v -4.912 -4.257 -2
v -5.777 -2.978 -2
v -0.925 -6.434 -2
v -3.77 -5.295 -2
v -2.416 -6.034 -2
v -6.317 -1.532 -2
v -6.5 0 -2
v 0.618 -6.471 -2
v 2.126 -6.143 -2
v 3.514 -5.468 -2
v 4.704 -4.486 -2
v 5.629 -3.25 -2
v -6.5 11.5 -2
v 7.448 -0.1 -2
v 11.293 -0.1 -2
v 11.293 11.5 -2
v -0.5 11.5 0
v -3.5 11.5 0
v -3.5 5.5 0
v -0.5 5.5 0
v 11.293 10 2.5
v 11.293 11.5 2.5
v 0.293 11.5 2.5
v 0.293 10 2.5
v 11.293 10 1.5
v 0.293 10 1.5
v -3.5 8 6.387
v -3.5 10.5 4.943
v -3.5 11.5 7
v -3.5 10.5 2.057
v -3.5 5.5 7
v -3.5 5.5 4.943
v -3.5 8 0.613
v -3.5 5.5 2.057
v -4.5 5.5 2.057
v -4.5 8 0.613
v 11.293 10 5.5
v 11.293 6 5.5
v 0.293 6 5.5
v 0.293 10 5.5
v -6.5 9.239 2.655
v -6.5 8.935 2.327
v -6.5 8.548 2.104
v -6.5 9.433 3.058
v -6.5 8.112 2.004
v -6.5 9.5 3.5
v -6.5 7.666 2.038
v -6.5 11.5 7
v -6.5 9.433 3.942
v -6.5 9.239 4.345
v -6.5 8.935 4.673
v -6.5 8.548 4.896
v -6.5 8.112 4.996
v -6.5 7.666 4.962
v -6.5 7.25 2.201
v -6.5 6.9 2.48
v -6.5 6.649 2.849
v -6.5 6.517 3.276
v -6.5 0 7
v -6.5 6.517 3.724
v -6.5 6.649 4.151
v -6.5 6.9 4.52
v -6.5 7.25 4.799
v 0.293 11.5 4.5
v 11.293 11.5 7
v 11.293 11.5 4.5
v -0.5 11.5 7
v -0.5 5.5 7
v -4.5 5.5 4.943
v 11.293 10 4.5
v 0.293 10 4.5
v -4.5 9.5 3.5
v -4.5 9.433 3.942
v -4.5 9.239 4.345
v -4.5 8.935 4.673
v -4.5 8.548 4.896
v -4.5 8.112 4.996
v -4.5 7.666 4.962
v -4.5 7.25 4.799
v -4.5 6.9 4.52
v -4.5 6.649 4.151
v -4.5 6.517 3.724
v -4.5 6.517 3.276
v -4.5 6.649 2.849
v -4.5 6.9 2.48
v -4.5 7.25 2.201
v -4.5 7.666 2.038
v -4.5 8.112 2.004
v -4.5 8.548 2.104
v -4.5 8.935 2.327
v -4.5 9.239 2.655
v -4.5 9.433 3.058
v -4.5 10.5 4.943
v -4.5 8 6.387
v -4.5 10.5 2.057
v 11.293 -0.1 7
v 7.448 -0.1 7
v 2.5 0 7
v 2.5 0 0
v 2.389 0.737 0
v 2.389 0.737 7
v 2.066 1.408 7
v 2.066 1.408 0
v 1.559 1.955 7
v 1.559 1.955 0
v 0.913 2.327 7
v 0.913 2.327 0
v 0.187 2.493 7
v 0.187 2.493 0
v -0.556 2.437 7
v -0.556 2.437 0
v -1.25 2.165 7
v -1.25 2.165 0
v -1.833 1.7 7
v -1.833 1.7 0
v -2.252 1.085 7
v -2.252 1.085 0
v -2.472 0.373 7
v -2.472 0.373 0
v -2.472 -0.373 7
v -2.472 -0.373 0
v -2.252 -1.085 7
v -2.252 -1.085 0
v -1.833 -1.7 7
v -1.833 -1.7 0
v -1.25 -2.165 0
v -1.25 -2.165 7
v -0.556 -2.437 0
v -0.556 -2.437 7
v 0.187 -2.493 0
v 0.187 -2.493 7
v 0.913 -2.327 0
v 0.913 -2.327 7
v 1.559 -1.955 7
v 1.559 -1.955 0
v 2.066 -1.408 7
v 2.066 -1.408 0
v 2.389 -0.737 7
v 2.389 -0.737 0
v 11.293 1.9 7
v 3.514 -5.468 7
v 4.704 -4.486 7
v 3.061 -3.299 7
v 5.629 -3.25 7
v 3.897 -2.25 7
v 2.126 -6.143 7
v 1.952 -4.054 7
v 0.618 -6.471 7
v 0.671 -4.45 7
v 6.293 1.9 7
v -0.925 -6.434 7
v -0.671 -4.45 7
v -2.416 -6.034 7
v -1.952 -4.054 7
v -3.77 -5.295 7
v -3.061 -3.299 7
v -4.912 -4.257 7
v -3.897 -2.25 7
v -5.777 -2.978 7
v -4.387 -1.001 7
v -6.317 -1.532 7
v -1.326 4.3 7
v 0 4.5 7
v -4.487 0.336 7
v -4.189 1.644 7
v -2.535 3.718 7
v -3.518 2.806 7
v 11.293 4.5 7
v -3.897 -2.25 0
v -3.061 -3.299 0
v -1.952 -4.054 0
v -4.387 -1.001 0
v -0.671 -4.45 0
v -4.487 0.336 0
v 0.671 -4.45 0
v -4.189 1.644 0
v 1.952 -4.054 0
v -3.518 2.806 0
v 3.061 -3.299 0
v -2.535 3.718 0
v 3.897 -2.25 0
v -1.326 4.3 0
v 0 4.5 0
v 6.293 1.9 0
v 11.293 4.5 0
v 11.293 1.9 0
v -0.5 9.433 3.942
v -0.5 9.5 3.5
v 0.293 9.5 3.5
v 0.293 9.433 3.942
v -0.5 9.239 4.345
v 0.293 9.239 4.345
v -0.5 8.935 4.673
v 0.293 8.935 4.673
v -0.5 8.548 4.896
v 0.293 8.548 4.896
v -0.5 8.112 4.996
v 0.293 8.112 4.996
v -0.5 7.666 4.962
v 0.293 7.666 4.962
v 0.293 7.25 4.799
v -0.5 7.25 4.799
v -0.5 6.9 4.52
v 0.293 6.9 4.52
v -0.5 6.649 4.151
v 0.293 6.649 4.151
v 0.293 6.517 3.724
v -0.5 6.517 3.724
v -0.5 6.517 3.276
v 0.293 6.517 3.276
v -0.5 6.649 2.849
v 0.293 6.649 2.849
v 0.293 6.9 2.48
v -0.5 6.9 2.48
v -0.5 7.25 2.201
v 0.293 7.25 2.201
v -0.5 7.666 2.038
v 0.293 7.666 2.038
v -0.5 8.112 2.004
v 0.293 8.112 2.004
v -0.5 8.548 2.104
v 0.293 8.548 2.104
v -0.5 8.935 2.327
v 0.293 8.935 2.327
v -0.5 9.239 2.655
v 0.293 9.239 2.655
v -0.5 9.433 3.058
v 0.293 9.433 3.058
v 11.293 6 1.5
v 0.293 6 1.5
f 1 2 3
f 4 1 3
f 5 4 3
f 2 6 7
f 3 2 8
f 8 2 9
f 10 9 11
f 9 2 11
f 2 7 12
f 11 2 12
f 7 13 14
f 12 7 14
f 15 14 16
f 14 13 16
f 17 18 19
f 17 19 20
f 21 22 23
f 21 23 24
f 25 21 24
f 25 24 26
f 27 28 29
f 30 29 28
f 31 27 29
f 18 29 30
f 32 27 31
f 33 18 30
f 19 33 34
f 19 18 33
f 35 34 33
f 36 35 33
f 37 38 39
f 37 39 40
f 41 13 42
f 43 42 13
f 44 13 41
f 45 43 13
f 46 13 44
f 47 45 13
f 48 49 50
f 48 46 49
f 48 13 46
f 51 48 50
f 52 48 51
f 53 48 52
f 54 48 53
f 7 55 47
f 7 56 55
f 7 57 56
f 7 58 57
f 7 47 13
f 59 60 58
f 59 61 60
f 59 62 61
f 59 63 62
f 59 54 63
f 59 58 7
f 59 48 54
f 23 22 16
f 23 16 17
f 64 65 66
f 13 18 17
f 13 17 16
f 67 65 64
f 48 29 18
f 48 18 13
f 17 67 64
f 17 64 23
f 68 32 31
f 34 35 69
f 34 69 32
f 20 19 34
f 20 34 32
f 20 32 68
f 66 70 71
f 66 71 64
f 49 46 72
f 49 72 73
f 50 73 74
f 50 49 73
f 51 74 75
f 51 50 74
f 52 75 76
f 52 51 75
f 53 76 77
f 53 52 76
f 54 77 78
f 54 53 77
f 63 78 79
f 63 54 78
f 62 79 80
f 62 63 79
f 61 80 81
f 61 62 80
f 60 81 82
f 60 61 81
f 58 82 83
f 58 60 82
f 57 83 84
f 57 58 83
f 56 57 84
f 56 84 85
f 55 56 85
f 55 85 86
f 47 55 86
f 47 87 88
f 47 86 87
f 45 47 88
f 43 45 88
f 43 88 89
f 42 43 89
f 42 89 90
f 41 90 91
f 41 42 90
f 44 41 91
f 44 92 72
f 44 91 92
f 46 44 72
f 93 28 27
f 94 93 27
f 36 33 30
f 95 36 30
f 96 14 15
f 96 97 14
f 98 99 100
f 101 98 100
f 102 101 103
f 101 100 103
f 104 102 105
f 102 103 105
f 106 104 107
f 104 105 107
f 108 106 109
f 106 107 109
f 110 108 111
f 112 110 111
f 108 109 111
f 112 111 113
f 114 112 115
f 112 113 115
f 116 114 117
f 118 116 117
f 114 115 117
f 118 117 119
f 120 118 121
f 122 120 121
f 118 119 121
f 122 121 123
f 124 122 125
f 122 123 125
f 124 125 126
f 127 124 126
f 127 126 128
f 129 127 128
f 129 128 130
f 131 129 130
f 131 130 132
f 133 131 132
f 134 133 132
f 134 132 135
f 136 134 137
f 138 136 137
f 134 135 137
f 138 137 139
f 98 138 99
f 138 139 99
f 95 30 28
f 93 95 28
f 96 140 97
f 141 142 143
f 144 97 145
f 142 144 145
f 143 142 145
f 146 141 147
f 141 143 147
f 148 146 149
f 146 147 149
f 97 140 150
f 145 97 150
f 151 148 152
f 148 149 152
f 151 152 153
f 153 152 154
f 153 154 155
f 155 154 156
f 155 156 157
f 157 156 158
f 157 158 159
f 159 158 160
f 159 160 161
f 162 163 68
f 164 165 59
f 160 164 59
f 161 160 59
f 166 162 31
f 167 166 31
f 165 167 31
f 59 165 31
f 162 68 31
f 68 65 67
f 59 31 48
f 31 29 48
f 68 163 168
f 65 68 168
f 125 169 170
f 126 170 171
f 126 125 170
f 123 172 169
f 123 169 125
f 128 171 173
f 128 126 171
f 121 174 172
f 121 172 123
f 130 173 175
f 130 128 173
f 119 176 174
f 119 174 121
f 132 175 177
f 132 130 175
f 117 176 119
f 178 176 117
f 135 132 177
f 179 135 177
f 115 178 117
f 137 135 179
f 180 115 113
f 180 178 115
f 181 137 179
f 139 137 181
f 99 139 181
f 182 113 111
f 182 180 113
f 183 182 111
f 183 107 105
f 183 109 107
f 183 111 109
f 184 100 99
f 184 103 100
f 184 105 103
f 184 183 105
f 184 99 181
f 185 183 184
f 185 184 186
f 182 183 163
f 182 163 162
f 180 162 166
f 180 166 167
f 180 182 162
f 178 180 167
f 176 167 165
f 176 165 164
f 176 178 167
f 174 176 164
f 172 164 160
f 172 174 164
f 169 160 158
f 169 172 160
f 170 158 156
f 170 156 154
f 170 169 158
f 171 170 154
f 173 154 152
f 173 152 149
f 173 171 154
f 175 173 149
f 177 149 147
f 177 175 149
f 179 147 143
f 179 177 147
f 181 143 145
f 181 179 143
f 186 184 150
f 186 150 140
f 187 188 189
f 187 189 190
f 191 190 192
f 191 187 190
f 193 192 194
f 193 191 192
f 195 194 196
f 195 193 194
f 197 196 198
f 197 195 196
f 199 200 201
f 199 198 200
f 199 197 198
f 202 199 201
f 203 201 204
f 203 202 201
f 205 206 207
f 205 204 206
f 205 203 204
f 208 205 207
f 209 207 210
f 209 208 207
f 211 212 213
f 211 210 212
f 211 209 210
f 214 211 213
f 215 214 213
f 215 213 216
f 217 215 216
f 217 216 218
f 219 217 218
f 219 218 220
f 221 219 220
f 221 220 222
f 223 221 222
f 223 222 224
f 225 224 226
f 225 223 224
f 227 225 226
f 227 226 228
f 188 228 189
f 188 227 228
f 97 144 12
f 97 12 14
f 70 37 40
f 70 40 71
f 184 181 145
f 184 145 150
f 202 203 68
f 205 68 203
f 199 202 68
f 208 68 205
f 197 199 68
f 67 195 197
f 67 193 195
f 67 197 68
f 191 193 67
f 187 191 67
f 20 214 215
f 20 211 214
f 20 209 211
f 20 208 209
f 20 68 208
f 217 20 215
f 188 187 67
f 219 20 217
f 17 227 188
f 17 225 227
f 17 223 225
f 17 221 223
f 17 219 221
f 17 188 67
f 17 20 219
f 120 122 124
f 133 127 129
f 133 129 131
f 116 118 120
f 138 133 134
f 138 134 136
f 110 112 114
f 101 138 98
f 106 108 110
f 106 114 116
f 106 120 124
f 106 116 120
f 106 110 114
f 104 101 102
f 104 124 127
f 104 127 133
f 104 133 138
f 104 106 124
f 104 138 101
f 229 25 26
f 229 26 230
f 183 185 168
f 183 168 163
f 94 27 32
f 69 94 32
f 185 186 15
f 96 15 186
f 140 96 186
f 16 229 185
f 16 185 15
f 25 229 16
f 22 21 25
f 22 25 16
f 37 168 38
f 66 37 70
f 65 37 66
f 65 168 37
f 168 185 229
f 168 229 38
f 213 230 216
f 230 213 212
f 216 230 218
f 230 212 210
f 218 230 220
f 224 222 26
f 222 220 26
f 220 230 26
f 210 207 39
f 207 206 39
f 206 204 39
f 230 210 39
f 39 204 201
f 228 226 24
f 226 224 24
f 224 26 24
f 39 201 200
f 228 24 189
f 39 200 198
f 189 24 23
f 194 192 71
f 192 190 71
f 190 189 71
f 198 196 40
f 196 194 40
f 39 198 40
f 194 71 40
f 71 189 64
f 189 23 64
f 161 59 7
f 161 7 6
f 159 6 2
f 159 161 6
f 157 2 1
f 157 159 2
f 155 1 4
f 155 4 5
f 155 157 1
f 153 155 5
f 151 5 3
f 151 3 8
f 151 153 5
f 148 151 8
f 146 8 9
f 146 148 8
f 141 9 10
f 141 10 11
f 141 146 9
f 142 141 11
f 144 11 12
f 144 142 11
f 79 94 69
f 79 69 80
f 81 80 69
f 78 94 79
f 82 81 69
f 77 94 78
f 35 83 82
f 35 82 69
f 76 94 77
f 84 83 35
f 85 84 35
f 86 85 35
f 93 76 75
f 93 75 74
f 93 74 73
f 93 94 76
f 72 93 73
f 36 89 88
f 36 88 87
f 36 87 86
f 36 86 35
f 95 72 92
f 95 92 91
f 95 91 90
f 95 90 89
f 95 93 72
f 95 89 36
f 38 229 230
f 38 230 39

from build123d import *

# Parameters (mm, degrees)
ESBO_O1_R                  = 2.5
RESSALTO_EXTRUS_O1_DEPTH   = 7
RESSALTO_EXTRUS_O1_2_DEPTH = 7
CORTE_EXTRUS_O1_DEPTH      = 1
CORTE_EXTRUS_O2_DEPTH      = 21.752652218
CORTE_EXTRUS_O2_DEPTH_BACK = 21.752652218
ESBO_O4_R                  = 1.5
CORTE_EXTRUS_O3_DEPTH      = 11
RESSALTO_EXTRUS_O5_START   = -7
ESBO_O6_W                  = 3
ESBO_O6_H                  = 6
RESSALTO_EXTRUS_O5_DEPTH   = 2


with BuildPart() as part:
    # Esboço1 → Ressalto-extrusão1 (new body)
    with BuildSketch(Plane.XY):
        Circle(ESBO_O1_R)
    extrude(amount=RESSALTO_EXTRUS_O1_DEPTH)



with BuildPart() as body_2:
    # Esboço1 → Ressalto-extrus_o1 2 (new body)
    with BuildSketch(Plane.XY):
        with BuildLine():
            ThreePointArc((0, 4.5), (-3.897114317, -2.25), (3.897114317, -2.25))
            Line((3.897114317, -2.25), (6.293117934, 1.9))
            Line((6.293117934, 1.9), (11.293117934, 1.9))
            Line((11.293117934, 1.9), (11.293117934, -0.1))
            Line((11.293117934, -0.1), (7.447818473, -0.1))
            Line((7.447818473, -0.1), (5.629165125, -3.25))
            ThreePointArc((5.629165125, -3.25), (-1.682323793, -6.278517871), (-6.5, 0))
            Line((-6.5, 0), (-6.5, 11.5))
            Line((-6.5, 11.5), (-3.5, 11.5))
            Line((-3.5, 11.5), (-3.5, 5.5))
            Line((-3.5, 5.5), (-0.5, 5.5))
            Line((-0.5, 5.5), (-0.5, 11.5))
            Line((-0.5, 11.5), (11.293117934, 11.5))
            Line((11.293117934, 11.5), (11.293117934, 6.5))
            Line((11.293117934, 6.5), (11.293117934, 4.5))
            Line((11.293117934, 4.5), (0, 4.5))
        make_face()
    extrude(amount=RESSALTO_EXTRUS_O1_2_DEPTH)

    # Esboço2 → Corte-extrusão1 (cut)
    with BuildSketch(Plane(origin=(-3.5, 0, 0), x_dir=(0, 0, -1), z_dir=(1, 0, 0))):
        Polygon((-0.613248654, 8), (-2.056624327, 10.5), (-4.943375673, 10.5), (-6.386751346, 8), (-4.943375673, 5.5), (-2.056624327, 5.5), align=None)
    extrude(amount=-CORTE_EXTRUS_O1_DEPTH, mode=Mode.SUBTRACT)

    # Esboço4 → Corte-extrusão2 (cut, two sides: drawn at the far end of the back side and taken through both)
    with BuildSketch(Plane(origin=(-4.5, 0, 0), x_dir=(0, 0, -1), z_dir=(1, 0, 0)).offset(-CORTE_EXTRUS_O2_DEPTH_BACK)):
        with Locations(Location((-3.5, 8, 0), (0, 0, 90))):
            Circle(ESBO_O4_R)
    extrude(amount=CORTE_EXTRUS_O2_DEPTH + CORTE_EXTRUS_O2_DEPTH_BACK, mode=Mode.SUBTRACT)

    # Esboço5 → Corte-extrusão3 (cut)
    with BuildSketch(Plane(origin=(11.293117934, 0, 0), x_dir=(0, 0, -1), z_dir=(1, 0, 0))):
        Polygon((-5.5, 10), (-4.5, 10), (-4.5, 11.5), (-2.5, 11.5), (-2.5, 10), (-1.5, 10), (-1.5, 6), (-5.5, 6), align=None)
    extrude(amount=-CORTE_EXTRUS_O3_DEPTH, mode=Mode.SUBTRACT)


with BuildPart() as part_1:
    add(part.part)

    add(body_2.part)  # Ressalto-extrusão5 merges body 2
    # Esboço6 → Ressalto-extrusão5 (add)
    with BuildSketch(Plane.XY.offset(7).offset(RESSALTO_EXTRUS_O5_START)):
        with BuildLine():
            Line((11.293117934, 1.9), (11.293117934, 4.5))
            Line((11.293117934, 4.5), (0, 4.5))
            ThreePointArc((0, 4.5), (-3.897114317, -2.25), (3.897114317, -2.25))
            Line((3.897114317, -2.25), (6.293117934, 1.9))
            Line((6.293117934, 1.9), (11.293117934, 1.9))
        make_face()
        with BuildLine():
            ThreePointArc((3.897114317, -2.25), (-3.897114317, -2.25), (0, 4.5))
            Line((0, 4.5), (11.293117934, 4.5))
            Line((11.293117934, 4.5), (11.293117934, 11.5))
            Line((11.293117934, 11.5), (-0.5, 11.5))
            Line((-0.5, 11.5), (-0.5, 5.5))
            Line((-0.5, 5.5), (-3.5, 5.5))
            Line((-3.5, 5.5), (-3.5, 11.5))
            Line((-3.5, 11.5), (-6.5, 11.5))
            Line((-6.5, 11.5), (-6.5, 0))
            ThreePointArc((-6.5, 0), (-1.682323793, -6.278517871), (5.629165125, -3.25))
            Line((5.629165125, -3.25), (7.447818473, -0.1))
            Line((7.447818473, -0.1), (11.293117934, -0.1))
            Line((11.293117934, -0.1), (11.293117934, 1.9))
            Line((11.293117934, 1.9), (6.293117934, 1.9))
            Line((6.293117934, 1.9), (3.897114317, -2.25))
        make_face()
        with Locations((-2, 8.5)):
            Rectangle(ESBO_O6_W, ESBO_O6_H)
    extrude(amount=-RESSALTO_EXTRUS_O5_DEPTH)


solid = part_1.part
